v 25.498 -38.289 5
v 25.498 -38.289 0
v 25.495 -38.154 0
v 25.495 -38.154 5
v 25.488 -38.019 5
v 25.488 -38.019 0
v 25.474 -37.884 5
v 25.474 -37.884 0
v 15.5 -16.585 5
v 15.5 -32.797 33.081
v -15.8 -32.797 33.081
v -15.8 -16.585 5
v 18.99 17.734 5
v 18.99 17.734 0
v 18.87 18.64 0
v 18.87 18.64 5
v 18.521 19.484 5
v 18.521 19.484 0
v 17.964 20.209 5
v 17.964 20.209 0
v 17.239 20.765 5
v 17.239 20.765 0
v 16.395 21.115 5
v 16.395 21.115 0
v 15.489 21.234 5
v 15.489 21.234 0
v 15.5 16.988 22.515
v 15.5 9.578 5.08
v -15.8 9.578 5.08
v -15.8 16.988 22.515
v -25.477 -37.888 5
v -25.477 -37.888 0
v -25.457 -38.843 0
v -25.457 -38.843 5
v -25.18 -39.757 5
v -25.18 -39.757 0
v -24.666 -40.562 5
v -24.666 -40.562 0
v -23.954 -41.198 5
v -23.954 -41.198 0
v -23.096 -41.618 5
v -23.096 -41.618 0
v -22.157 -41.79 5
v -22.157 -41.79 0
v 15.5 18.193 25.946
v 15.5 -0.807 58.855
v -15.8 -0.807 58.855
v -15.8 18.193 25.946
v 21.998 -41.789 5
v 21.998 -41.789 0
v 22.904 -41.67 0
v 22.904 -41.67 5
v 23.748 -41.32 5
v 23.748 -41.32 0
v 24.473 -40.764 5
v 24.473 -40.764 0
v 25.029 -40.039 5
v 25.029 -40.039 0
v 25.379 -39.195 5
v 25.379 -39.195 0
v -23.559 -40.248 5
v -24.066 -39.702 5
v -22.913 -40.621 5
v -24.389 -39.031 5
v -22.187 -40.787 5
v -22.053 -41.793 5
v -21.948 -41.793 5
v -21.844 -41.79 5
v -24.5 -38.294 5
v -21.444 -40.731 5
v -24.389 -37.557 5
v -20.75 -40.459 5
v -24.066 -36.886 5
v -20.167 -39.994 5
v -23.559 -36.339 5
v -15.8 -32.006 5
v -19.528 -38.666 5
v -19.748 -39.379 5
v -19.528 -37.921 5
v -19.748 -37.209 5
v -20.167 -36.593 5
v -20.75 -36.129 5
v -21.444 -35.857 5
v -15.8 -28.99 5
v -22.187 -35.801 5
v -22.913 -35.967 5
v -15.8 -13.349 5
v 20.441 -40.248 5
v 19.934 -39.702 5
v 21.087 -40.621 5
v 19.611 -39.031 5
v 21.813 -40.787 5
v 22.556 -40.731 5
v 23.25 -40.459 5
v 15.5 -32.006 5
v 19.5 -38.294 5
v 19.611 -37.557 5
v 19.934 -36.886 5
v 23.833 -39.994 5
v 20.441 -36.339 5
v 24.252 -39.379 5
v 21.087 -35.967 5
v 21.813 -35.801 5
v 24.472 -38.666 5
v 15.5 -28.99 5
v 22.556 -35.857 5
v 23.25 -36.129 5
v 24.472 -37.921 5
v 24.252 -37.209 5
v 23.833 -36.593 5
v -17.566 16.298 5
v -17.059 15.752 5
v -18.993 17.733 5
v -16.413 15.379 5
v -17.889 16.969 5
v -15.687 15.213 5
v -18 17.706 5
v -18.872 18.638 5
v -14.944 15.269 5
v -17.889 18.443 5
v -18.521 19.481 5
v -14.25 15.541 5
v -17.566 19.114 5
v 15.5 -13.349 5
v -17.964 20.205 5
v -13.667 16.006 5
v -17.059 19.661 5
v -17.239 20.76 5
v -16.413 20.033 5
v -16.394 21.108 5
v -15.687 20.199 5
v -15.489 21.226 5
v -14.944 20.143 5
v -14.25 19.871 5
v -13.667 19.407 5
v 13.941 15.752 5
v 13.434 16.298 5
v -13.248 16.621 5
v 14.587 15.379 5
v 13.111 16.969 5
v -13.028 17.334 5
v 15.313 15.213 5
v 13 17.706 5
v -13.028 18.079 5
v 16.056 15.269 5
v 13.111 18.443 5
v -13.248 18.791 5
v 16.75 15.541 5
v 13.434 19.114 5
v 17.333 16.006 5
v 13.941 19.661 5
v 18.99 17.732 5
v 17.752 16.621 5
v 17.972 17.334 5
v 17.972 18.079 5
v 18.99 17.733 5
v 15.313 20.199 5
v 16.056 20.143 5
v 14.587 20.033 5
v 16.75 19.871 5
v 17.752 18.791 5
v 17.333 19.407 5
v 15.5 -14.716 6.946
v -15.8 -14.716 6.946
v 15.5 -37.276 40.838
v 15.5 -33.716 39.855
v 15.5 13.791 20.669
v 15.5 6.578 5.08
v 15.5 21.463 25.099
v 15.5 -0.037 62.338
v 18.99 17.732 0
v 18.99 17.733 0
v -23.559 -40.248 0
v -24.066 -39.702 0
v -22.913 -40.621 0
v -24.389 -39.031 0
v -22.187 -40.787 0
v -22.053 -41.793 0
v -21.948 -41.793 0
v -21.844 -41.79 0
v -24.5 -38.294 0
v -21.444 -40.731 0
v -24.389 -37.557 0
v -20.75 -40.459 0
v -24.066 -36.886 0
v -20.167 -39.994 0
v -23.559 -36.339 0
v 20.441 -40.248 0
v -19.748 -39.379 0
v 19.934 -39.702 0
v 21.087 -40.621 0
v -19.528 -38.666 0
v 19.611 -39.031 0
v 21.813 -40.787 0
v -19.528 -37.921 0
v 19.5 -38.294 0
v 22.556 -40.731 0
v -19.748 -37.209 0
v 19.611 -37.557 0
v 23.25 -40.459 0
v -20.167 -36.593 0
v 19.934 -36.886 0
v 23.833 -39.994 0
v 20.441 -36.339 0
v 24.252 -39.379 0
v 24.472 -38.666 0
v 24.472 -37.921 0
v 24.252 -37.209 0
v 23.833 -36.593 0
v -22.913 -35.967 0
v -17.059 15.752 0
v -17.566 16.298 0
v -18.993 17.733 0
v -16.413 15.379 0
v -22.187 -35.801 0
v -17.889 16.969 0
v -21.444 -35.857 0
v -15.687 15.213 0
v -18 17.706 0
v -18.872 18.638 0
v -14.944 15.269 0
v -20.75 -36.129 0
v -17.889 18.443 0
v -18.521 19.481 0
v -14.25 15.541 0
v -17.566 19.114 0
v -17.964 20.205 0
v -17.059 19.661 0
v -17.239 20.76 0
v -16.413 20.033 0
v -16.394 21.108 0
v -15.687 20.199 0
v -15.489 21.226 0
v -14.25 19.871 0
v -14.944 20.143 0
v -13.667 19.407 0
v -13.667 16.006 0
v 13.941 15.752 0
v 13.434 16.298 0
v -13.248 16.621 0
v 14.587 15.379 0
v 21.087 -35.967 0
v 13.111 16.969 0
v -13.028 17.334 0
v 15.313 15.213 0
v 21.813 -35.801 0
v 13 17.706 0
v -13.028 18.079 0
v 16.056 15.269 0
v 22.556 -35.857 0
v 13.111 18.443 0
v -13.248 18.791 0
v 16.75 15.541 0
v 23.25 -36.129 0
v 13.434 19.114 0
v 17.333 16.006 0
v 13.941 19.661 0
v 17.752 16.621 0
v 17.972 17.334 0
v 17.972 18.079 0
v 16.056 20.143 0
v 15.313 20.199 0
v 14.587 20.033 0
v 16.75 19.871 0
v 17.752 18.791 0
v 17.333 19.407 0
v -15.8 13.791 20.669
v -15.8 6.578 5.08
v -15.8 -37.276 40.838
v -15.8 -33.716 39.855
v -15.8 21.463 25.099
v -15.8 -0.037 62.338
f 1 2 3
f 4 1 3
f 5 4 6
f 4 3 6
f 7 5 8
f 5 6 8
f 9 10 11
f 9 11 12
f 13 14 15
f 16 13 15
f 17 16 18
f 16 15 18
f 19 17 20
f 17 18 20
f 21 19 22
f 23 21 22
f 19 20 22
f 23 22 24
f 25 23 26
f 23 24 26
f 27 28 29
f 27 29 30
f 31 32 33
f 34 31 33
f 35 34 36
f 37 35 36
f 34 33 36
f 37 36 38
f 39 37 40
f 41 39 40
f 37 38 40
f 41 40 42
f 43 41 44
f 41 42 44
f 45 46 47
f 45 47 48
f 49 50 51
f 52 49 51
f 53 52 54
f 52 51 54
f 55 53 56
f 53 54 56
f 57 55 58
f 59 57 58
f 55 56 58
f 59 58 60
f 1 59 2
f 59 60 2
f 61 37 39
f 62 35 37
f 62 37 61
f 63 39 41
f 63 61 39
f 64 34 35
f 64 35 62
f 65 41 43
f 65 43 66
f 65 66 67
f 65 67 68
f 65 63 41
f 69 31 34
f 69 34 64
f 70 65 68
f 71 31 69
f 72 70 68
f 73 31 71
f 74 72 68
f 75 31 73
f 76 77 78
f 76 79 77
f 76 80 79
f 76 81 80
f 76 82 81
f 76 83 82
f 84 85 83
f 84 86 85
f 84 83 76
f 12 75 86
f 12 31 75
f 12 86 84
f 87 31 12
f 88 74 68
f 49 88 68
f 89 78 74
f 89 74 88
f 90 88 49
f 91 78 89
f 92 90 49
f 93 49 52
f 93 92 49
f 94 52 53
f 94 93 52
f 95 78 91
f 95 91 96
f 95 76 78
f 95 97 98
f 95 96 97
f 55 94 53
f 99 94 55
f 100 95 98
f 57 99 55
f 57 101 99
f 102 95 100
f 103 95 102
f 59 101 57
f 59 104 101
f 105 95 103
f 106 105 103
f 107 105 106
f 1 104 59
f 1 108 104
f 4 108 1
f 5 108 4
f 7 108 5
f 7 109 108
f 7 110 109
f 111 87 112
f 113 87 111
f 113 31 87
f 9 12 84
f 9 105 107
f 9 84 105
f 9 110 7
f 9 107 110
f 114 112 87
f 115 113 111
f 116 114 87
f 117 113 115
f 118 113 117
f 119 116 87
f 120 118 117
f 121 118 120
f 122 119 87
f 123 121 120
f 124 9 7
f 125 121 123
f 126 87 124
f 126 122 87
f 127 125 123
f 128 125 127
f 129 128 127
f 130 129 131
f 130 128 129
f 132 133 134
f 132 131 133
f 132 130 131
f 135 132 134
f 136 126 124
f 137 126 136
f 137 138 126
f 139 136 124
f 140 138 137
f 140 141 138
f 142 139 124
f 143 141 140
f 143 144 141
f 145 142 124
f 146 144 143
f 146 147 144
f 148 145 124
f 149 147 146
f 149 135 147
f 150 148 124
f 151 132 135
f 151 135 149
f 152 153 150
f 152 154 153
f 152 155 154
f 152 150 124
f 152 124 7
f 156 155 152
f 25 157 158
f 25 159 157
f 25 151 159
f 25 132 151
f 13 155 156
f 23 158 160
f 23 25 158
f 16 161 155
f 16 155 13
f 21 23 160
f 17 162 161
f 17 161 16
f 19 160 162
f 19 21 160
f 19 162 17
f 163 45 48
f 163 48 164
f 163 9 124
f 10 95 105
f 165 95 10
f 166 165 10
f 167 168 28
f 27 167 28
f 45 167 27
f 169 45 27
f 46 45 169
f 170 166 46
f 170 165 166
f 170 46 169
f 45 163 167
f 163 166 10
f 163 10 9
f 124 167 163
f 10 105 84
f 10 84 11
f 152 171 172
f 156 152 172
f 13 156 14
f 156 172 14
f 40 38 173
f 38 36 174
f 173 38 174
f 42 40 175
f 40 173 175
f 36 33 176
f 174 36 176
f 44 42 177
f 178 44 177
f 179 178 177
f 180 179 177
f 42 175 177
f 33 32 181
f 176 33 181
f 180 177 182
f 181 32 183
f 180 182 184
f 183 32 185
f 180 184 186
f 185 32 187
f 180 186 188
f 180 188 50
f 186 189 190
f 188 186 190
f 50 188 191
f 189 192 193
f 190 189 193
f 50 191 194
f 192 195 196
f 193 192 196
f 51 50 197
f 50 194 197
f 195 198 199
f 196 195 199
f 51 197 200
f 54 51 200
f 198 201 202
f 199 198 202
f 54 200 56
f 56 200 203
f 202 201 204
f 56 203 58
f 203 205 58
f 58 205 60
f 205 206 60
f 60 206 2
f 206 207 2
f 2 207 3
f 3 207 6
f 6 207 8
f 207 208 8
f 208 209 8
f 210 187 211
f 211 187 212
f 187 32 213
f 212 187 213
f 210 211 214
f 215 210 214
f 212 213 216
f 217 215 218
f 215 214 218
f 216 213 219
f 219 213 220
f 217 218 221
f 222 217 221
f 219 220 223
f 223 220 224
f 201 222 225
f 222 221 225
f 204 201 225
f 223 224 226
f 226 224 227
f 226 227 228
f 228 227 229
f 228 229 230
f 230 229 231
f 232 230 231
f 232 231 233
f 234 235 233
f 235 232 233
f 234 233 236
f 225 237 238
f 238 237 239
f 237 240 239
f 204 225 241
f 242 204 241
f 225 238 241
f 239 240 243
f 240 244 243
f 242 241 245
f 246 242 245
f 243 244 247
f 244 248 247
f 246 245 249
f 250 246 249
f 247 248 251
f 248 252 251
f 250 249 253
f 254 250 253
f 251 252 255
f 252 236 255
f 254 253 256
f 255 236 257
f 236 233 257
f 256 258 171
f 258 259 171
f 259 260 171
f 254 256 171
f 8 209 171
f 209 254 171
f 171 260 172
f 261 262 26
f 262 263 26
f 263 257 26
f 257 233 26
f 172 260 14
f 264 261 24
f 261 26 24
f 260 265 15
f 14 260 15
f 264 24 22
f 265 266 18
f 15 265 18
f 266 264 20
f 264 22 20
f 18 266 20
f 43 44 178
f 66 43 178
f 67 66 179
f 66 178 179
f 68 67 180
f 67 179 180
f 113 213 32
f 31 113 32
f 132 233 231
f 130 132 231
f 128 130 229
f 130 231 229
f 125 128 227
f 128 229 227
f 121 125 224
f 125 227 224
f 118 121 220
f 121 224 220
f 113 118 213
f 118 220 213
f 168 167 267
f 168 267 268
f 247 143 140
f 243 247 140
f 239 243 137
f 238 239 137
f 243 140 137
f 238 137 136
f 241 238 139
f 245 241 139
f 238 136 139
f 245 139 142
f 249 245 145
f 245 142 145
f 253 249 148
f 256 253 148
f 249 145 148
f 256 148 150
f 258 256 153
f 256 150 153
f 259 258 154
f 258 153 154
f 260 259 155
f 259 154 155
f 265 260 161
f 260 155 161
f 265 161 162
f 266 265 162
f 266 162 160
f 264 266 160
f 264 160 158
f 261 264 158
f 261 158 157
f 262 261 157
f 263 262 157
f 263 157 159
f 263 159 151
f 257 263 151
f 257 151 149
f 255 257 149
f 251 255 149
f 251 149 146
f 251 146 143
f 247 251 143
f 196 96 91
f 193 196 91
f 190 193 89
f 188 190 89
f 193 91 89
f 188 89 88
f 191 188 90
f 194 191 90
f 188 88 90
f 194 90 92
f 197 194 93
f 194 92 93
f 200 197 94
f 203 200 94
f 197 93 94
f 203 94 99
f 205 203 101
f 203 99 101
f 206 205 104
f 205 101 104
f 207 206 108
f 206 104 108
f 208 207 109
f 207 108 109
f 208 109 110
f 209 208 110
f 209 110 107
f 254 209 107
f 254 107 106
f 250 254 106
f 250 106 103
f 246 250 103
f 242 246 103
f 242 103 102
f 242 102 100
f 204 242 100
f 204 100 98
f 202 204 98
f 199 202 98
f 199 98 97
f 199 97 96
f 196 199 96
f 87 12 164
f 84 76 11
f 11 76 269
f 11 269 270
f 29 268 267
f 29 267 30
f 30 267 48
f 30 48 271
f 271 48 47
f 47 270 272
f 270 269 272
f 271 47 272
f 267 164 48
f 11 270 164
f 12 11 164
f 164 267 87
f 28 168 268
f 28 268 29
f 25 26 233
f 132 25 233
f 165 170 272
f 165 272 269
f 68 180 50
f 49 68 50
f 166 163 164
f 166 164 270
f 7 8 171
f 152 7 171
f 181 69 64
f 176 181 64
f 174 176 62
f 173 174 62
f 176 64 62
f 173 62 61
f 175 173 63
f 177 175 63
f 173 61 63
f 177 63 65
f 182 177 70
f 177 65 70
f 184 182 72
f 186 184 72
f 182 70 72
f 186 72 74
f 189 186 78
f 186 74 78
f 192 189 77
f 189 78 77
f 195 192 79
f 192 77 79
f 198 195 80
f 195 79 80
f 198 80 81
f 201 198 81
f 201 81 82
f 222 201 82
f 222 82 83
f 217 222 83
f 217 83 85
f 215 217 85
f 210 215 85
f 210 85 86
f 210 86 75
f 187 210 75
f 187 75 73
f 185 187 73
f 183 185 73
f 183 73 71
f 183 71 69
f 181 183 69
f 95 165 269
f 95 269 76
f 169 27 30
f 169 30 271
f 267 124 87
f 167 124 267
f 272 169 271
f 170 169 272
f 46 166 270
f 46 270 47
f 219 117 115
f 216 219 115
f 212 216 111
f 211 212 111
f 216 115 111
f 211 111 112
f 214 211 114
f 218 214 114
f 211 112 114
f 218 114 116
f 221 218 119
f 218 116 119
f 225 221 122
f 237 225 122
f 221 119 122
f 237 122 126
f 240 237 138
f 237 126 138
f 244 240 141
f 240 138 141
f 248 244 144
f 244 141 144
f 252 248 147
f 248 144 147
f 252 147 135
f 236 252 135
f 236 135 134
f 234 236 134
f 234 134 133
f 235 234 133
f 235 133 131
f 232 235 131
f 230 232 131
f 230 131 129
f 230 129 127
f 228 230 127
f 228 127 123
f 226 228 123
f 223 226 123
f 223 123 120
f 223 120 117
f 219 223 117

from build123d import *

# Parameters (mm, degrees)
F2_DEPTH = 5
F3_D     = 5
F6_DEPTH = 31.3


with BuildPart() as f2:
    # F1 (on Top) → F2 (new body)
    with BuildSketch(Plane.XY):
        with BuildLine():
            ThreePointArc((-18.9928135453, 17.7327254881), (-15.4959787625, 14.226407891), (-11.9928192496, 17.726406465))
            ThreePointArc((-11.9928192496, 17.726406465), (-13.0164454835, 20.1997792575), (-15.4885752329, 21.2264038919))
            ThreePointArc((-15.4885752329, 21.2264038919), (-17.9639555673, 20.2050119801), (-18.9928135453, 17.7327254881))
        make_face()
        with BuildLine():
            ThreePointArc((-15.4885752329, 21.2264038919), (-13.0164454835, 20.1997792575), (-11.9928192496, 17.726406465))
            ThreePointArc((-11.9928192496, 17.726406465), (-15.4959787625, 14.226407891), (-18.9928135453, 17.7327254881))
            Line((-18.9928135453, 17.7327254881), (-25.4770891107, -37.888429023))
            ThreePointArc((-25.4770891107, -37.888429023), (-21.797650123, -34.7996028161), (-18.5006331801, -38.2937118411))
            ThreePointArc((-18.5006331801, -38.2937118411), (-19.4711098532, -40.7127016589), (-21.8443541735, -41.7902210821))
            Line((-21.8443541735, -41.7902210821), (21.9980642511, -41.7891520748))
            ThreePointArc((21.9980642511, -41.7891520748), (19.3836869362, -35.9620342294), (25.4744262299, -37.8837953968))
            Line((25.4744262299, -37.8837953968), (18.9895786755, 17.7319920337))
            ThreePointArc((18.9895786755, 17.7319920337), (13.0143403088, 15.2593596765), (15.4887358258, 21.2338681198))
            Line((15.4887358258, 21.2338681198), (-15.4885752329, 21.2264038919))
        make_face()
        with BuildLine():
            ThreePointArc((18.9895791784, 17.7338682214), (17.9641547244, 20.2090401077), (15.4887358258, 21.2338681198))
            ThreePointArc((15.4887358258, 21.2338681198), (13.0143403088, 15.2593596765), (18.9895786755, 17.7319920337))
            ThreePointArc((18.9895786755, 17.7319920337), (18.9895790527, 17.7329301275), (18.9895791784, 17.7338682214))
        make_face()
        with BuildLine():
            ThreePointArc((-18.5006331801, -38.2937118411), (-21.797650123, -34.7996028161), (-25.4770891107, -37.888429023))
            ThreePointArc((-25.4770891107, -37.888429023), (-24.6661333689, -40.5619950562), (-22.1567416762, -41.790228699))
            Line((-22.1567416762, -41.790228699), (-21.8443541735, -41.7902210821))
            ThreePointArc((-21.8443541735, -41.7902210821), (-19.4711098532, -40.7127016589), (-18.5006331801, -38.2937118411))
        make_face()
        with BuildLine():
            Line((-21.8443541735, -41.7902210821), (-22.1567416762, -41.790228699))
            ThreePointArc((-22.1567416762, -41.790228699), (-22.0005478398, -41.7937118401), (-21.8443541735, -41.7902210821))
        make_face()
        with BuildLine():
            ThreePointArc((25.4979789108, -38.2891520759), (25.4920857793, -38.0861319007), (25.4744262299, -37.8837953968))
            ThreePointArc((25.4744262299, -37.8837953968), (19.3836869362, -35.9620342294), (21.9980642511, -41.7891520748))
            ThreePointArc((21.9980642511, -41.7891520748), (24.4728828171, -40.7639956375), (25.4979789108, -38.2891520759))
        make_face()
    extrude(amount=F2_DEPTH)

    # F3 (through all)
    with Locations(Plane(origin=(0, 0, 0), x_dir=(1, 0, 0), z_dir=(0, 0, -1))):
        with Locations((-15.5, -17.7061764002), (15.5, -17.7061764002), (-22, 38.2938235998), (22, 38.2938235998)):
            Hole(F3_D / 2)

    # F5 (on offset) → F6 (join)
    with BuildSketch(Plane.YZ.offset(15.5)):
        Polygon((-28.8004414439, 3.5987684969), (-32.7974634149, 33.0814354707), (-37.2756377012, 40.8378608596), (-31.8004414439, 3.5987684969), align=None)
        Polygon((-37.2756377012, 40.8378608596), (-32.7974634149, 33.0814354707), (-15.7756377012, 3.5987684969), (13.7907450582, 20.6689275419), (16.9883244112, 22.5150508422), (21.4634546616, 25.0987684969), (-0.0365453384, 62.3378608596), align=None)
        Polygon((18.1931839084, 25.9461292587), (-14.7157814354, 6.9461292587), (-33.7157814354, 39.8550946025), (-0.8068160916, 58.8550946025), align=None, mode=Mode.SUBTRACT)
        Polygon((16.9883244112, 22.5150508422), (13.7907450582, 20.6689275419), (6.5782903694, 5.0800526515), (9.5782903694, 5.0800526515), align=None)
    extrude(amount=-F6_DEPTH)


solid = f2.part
